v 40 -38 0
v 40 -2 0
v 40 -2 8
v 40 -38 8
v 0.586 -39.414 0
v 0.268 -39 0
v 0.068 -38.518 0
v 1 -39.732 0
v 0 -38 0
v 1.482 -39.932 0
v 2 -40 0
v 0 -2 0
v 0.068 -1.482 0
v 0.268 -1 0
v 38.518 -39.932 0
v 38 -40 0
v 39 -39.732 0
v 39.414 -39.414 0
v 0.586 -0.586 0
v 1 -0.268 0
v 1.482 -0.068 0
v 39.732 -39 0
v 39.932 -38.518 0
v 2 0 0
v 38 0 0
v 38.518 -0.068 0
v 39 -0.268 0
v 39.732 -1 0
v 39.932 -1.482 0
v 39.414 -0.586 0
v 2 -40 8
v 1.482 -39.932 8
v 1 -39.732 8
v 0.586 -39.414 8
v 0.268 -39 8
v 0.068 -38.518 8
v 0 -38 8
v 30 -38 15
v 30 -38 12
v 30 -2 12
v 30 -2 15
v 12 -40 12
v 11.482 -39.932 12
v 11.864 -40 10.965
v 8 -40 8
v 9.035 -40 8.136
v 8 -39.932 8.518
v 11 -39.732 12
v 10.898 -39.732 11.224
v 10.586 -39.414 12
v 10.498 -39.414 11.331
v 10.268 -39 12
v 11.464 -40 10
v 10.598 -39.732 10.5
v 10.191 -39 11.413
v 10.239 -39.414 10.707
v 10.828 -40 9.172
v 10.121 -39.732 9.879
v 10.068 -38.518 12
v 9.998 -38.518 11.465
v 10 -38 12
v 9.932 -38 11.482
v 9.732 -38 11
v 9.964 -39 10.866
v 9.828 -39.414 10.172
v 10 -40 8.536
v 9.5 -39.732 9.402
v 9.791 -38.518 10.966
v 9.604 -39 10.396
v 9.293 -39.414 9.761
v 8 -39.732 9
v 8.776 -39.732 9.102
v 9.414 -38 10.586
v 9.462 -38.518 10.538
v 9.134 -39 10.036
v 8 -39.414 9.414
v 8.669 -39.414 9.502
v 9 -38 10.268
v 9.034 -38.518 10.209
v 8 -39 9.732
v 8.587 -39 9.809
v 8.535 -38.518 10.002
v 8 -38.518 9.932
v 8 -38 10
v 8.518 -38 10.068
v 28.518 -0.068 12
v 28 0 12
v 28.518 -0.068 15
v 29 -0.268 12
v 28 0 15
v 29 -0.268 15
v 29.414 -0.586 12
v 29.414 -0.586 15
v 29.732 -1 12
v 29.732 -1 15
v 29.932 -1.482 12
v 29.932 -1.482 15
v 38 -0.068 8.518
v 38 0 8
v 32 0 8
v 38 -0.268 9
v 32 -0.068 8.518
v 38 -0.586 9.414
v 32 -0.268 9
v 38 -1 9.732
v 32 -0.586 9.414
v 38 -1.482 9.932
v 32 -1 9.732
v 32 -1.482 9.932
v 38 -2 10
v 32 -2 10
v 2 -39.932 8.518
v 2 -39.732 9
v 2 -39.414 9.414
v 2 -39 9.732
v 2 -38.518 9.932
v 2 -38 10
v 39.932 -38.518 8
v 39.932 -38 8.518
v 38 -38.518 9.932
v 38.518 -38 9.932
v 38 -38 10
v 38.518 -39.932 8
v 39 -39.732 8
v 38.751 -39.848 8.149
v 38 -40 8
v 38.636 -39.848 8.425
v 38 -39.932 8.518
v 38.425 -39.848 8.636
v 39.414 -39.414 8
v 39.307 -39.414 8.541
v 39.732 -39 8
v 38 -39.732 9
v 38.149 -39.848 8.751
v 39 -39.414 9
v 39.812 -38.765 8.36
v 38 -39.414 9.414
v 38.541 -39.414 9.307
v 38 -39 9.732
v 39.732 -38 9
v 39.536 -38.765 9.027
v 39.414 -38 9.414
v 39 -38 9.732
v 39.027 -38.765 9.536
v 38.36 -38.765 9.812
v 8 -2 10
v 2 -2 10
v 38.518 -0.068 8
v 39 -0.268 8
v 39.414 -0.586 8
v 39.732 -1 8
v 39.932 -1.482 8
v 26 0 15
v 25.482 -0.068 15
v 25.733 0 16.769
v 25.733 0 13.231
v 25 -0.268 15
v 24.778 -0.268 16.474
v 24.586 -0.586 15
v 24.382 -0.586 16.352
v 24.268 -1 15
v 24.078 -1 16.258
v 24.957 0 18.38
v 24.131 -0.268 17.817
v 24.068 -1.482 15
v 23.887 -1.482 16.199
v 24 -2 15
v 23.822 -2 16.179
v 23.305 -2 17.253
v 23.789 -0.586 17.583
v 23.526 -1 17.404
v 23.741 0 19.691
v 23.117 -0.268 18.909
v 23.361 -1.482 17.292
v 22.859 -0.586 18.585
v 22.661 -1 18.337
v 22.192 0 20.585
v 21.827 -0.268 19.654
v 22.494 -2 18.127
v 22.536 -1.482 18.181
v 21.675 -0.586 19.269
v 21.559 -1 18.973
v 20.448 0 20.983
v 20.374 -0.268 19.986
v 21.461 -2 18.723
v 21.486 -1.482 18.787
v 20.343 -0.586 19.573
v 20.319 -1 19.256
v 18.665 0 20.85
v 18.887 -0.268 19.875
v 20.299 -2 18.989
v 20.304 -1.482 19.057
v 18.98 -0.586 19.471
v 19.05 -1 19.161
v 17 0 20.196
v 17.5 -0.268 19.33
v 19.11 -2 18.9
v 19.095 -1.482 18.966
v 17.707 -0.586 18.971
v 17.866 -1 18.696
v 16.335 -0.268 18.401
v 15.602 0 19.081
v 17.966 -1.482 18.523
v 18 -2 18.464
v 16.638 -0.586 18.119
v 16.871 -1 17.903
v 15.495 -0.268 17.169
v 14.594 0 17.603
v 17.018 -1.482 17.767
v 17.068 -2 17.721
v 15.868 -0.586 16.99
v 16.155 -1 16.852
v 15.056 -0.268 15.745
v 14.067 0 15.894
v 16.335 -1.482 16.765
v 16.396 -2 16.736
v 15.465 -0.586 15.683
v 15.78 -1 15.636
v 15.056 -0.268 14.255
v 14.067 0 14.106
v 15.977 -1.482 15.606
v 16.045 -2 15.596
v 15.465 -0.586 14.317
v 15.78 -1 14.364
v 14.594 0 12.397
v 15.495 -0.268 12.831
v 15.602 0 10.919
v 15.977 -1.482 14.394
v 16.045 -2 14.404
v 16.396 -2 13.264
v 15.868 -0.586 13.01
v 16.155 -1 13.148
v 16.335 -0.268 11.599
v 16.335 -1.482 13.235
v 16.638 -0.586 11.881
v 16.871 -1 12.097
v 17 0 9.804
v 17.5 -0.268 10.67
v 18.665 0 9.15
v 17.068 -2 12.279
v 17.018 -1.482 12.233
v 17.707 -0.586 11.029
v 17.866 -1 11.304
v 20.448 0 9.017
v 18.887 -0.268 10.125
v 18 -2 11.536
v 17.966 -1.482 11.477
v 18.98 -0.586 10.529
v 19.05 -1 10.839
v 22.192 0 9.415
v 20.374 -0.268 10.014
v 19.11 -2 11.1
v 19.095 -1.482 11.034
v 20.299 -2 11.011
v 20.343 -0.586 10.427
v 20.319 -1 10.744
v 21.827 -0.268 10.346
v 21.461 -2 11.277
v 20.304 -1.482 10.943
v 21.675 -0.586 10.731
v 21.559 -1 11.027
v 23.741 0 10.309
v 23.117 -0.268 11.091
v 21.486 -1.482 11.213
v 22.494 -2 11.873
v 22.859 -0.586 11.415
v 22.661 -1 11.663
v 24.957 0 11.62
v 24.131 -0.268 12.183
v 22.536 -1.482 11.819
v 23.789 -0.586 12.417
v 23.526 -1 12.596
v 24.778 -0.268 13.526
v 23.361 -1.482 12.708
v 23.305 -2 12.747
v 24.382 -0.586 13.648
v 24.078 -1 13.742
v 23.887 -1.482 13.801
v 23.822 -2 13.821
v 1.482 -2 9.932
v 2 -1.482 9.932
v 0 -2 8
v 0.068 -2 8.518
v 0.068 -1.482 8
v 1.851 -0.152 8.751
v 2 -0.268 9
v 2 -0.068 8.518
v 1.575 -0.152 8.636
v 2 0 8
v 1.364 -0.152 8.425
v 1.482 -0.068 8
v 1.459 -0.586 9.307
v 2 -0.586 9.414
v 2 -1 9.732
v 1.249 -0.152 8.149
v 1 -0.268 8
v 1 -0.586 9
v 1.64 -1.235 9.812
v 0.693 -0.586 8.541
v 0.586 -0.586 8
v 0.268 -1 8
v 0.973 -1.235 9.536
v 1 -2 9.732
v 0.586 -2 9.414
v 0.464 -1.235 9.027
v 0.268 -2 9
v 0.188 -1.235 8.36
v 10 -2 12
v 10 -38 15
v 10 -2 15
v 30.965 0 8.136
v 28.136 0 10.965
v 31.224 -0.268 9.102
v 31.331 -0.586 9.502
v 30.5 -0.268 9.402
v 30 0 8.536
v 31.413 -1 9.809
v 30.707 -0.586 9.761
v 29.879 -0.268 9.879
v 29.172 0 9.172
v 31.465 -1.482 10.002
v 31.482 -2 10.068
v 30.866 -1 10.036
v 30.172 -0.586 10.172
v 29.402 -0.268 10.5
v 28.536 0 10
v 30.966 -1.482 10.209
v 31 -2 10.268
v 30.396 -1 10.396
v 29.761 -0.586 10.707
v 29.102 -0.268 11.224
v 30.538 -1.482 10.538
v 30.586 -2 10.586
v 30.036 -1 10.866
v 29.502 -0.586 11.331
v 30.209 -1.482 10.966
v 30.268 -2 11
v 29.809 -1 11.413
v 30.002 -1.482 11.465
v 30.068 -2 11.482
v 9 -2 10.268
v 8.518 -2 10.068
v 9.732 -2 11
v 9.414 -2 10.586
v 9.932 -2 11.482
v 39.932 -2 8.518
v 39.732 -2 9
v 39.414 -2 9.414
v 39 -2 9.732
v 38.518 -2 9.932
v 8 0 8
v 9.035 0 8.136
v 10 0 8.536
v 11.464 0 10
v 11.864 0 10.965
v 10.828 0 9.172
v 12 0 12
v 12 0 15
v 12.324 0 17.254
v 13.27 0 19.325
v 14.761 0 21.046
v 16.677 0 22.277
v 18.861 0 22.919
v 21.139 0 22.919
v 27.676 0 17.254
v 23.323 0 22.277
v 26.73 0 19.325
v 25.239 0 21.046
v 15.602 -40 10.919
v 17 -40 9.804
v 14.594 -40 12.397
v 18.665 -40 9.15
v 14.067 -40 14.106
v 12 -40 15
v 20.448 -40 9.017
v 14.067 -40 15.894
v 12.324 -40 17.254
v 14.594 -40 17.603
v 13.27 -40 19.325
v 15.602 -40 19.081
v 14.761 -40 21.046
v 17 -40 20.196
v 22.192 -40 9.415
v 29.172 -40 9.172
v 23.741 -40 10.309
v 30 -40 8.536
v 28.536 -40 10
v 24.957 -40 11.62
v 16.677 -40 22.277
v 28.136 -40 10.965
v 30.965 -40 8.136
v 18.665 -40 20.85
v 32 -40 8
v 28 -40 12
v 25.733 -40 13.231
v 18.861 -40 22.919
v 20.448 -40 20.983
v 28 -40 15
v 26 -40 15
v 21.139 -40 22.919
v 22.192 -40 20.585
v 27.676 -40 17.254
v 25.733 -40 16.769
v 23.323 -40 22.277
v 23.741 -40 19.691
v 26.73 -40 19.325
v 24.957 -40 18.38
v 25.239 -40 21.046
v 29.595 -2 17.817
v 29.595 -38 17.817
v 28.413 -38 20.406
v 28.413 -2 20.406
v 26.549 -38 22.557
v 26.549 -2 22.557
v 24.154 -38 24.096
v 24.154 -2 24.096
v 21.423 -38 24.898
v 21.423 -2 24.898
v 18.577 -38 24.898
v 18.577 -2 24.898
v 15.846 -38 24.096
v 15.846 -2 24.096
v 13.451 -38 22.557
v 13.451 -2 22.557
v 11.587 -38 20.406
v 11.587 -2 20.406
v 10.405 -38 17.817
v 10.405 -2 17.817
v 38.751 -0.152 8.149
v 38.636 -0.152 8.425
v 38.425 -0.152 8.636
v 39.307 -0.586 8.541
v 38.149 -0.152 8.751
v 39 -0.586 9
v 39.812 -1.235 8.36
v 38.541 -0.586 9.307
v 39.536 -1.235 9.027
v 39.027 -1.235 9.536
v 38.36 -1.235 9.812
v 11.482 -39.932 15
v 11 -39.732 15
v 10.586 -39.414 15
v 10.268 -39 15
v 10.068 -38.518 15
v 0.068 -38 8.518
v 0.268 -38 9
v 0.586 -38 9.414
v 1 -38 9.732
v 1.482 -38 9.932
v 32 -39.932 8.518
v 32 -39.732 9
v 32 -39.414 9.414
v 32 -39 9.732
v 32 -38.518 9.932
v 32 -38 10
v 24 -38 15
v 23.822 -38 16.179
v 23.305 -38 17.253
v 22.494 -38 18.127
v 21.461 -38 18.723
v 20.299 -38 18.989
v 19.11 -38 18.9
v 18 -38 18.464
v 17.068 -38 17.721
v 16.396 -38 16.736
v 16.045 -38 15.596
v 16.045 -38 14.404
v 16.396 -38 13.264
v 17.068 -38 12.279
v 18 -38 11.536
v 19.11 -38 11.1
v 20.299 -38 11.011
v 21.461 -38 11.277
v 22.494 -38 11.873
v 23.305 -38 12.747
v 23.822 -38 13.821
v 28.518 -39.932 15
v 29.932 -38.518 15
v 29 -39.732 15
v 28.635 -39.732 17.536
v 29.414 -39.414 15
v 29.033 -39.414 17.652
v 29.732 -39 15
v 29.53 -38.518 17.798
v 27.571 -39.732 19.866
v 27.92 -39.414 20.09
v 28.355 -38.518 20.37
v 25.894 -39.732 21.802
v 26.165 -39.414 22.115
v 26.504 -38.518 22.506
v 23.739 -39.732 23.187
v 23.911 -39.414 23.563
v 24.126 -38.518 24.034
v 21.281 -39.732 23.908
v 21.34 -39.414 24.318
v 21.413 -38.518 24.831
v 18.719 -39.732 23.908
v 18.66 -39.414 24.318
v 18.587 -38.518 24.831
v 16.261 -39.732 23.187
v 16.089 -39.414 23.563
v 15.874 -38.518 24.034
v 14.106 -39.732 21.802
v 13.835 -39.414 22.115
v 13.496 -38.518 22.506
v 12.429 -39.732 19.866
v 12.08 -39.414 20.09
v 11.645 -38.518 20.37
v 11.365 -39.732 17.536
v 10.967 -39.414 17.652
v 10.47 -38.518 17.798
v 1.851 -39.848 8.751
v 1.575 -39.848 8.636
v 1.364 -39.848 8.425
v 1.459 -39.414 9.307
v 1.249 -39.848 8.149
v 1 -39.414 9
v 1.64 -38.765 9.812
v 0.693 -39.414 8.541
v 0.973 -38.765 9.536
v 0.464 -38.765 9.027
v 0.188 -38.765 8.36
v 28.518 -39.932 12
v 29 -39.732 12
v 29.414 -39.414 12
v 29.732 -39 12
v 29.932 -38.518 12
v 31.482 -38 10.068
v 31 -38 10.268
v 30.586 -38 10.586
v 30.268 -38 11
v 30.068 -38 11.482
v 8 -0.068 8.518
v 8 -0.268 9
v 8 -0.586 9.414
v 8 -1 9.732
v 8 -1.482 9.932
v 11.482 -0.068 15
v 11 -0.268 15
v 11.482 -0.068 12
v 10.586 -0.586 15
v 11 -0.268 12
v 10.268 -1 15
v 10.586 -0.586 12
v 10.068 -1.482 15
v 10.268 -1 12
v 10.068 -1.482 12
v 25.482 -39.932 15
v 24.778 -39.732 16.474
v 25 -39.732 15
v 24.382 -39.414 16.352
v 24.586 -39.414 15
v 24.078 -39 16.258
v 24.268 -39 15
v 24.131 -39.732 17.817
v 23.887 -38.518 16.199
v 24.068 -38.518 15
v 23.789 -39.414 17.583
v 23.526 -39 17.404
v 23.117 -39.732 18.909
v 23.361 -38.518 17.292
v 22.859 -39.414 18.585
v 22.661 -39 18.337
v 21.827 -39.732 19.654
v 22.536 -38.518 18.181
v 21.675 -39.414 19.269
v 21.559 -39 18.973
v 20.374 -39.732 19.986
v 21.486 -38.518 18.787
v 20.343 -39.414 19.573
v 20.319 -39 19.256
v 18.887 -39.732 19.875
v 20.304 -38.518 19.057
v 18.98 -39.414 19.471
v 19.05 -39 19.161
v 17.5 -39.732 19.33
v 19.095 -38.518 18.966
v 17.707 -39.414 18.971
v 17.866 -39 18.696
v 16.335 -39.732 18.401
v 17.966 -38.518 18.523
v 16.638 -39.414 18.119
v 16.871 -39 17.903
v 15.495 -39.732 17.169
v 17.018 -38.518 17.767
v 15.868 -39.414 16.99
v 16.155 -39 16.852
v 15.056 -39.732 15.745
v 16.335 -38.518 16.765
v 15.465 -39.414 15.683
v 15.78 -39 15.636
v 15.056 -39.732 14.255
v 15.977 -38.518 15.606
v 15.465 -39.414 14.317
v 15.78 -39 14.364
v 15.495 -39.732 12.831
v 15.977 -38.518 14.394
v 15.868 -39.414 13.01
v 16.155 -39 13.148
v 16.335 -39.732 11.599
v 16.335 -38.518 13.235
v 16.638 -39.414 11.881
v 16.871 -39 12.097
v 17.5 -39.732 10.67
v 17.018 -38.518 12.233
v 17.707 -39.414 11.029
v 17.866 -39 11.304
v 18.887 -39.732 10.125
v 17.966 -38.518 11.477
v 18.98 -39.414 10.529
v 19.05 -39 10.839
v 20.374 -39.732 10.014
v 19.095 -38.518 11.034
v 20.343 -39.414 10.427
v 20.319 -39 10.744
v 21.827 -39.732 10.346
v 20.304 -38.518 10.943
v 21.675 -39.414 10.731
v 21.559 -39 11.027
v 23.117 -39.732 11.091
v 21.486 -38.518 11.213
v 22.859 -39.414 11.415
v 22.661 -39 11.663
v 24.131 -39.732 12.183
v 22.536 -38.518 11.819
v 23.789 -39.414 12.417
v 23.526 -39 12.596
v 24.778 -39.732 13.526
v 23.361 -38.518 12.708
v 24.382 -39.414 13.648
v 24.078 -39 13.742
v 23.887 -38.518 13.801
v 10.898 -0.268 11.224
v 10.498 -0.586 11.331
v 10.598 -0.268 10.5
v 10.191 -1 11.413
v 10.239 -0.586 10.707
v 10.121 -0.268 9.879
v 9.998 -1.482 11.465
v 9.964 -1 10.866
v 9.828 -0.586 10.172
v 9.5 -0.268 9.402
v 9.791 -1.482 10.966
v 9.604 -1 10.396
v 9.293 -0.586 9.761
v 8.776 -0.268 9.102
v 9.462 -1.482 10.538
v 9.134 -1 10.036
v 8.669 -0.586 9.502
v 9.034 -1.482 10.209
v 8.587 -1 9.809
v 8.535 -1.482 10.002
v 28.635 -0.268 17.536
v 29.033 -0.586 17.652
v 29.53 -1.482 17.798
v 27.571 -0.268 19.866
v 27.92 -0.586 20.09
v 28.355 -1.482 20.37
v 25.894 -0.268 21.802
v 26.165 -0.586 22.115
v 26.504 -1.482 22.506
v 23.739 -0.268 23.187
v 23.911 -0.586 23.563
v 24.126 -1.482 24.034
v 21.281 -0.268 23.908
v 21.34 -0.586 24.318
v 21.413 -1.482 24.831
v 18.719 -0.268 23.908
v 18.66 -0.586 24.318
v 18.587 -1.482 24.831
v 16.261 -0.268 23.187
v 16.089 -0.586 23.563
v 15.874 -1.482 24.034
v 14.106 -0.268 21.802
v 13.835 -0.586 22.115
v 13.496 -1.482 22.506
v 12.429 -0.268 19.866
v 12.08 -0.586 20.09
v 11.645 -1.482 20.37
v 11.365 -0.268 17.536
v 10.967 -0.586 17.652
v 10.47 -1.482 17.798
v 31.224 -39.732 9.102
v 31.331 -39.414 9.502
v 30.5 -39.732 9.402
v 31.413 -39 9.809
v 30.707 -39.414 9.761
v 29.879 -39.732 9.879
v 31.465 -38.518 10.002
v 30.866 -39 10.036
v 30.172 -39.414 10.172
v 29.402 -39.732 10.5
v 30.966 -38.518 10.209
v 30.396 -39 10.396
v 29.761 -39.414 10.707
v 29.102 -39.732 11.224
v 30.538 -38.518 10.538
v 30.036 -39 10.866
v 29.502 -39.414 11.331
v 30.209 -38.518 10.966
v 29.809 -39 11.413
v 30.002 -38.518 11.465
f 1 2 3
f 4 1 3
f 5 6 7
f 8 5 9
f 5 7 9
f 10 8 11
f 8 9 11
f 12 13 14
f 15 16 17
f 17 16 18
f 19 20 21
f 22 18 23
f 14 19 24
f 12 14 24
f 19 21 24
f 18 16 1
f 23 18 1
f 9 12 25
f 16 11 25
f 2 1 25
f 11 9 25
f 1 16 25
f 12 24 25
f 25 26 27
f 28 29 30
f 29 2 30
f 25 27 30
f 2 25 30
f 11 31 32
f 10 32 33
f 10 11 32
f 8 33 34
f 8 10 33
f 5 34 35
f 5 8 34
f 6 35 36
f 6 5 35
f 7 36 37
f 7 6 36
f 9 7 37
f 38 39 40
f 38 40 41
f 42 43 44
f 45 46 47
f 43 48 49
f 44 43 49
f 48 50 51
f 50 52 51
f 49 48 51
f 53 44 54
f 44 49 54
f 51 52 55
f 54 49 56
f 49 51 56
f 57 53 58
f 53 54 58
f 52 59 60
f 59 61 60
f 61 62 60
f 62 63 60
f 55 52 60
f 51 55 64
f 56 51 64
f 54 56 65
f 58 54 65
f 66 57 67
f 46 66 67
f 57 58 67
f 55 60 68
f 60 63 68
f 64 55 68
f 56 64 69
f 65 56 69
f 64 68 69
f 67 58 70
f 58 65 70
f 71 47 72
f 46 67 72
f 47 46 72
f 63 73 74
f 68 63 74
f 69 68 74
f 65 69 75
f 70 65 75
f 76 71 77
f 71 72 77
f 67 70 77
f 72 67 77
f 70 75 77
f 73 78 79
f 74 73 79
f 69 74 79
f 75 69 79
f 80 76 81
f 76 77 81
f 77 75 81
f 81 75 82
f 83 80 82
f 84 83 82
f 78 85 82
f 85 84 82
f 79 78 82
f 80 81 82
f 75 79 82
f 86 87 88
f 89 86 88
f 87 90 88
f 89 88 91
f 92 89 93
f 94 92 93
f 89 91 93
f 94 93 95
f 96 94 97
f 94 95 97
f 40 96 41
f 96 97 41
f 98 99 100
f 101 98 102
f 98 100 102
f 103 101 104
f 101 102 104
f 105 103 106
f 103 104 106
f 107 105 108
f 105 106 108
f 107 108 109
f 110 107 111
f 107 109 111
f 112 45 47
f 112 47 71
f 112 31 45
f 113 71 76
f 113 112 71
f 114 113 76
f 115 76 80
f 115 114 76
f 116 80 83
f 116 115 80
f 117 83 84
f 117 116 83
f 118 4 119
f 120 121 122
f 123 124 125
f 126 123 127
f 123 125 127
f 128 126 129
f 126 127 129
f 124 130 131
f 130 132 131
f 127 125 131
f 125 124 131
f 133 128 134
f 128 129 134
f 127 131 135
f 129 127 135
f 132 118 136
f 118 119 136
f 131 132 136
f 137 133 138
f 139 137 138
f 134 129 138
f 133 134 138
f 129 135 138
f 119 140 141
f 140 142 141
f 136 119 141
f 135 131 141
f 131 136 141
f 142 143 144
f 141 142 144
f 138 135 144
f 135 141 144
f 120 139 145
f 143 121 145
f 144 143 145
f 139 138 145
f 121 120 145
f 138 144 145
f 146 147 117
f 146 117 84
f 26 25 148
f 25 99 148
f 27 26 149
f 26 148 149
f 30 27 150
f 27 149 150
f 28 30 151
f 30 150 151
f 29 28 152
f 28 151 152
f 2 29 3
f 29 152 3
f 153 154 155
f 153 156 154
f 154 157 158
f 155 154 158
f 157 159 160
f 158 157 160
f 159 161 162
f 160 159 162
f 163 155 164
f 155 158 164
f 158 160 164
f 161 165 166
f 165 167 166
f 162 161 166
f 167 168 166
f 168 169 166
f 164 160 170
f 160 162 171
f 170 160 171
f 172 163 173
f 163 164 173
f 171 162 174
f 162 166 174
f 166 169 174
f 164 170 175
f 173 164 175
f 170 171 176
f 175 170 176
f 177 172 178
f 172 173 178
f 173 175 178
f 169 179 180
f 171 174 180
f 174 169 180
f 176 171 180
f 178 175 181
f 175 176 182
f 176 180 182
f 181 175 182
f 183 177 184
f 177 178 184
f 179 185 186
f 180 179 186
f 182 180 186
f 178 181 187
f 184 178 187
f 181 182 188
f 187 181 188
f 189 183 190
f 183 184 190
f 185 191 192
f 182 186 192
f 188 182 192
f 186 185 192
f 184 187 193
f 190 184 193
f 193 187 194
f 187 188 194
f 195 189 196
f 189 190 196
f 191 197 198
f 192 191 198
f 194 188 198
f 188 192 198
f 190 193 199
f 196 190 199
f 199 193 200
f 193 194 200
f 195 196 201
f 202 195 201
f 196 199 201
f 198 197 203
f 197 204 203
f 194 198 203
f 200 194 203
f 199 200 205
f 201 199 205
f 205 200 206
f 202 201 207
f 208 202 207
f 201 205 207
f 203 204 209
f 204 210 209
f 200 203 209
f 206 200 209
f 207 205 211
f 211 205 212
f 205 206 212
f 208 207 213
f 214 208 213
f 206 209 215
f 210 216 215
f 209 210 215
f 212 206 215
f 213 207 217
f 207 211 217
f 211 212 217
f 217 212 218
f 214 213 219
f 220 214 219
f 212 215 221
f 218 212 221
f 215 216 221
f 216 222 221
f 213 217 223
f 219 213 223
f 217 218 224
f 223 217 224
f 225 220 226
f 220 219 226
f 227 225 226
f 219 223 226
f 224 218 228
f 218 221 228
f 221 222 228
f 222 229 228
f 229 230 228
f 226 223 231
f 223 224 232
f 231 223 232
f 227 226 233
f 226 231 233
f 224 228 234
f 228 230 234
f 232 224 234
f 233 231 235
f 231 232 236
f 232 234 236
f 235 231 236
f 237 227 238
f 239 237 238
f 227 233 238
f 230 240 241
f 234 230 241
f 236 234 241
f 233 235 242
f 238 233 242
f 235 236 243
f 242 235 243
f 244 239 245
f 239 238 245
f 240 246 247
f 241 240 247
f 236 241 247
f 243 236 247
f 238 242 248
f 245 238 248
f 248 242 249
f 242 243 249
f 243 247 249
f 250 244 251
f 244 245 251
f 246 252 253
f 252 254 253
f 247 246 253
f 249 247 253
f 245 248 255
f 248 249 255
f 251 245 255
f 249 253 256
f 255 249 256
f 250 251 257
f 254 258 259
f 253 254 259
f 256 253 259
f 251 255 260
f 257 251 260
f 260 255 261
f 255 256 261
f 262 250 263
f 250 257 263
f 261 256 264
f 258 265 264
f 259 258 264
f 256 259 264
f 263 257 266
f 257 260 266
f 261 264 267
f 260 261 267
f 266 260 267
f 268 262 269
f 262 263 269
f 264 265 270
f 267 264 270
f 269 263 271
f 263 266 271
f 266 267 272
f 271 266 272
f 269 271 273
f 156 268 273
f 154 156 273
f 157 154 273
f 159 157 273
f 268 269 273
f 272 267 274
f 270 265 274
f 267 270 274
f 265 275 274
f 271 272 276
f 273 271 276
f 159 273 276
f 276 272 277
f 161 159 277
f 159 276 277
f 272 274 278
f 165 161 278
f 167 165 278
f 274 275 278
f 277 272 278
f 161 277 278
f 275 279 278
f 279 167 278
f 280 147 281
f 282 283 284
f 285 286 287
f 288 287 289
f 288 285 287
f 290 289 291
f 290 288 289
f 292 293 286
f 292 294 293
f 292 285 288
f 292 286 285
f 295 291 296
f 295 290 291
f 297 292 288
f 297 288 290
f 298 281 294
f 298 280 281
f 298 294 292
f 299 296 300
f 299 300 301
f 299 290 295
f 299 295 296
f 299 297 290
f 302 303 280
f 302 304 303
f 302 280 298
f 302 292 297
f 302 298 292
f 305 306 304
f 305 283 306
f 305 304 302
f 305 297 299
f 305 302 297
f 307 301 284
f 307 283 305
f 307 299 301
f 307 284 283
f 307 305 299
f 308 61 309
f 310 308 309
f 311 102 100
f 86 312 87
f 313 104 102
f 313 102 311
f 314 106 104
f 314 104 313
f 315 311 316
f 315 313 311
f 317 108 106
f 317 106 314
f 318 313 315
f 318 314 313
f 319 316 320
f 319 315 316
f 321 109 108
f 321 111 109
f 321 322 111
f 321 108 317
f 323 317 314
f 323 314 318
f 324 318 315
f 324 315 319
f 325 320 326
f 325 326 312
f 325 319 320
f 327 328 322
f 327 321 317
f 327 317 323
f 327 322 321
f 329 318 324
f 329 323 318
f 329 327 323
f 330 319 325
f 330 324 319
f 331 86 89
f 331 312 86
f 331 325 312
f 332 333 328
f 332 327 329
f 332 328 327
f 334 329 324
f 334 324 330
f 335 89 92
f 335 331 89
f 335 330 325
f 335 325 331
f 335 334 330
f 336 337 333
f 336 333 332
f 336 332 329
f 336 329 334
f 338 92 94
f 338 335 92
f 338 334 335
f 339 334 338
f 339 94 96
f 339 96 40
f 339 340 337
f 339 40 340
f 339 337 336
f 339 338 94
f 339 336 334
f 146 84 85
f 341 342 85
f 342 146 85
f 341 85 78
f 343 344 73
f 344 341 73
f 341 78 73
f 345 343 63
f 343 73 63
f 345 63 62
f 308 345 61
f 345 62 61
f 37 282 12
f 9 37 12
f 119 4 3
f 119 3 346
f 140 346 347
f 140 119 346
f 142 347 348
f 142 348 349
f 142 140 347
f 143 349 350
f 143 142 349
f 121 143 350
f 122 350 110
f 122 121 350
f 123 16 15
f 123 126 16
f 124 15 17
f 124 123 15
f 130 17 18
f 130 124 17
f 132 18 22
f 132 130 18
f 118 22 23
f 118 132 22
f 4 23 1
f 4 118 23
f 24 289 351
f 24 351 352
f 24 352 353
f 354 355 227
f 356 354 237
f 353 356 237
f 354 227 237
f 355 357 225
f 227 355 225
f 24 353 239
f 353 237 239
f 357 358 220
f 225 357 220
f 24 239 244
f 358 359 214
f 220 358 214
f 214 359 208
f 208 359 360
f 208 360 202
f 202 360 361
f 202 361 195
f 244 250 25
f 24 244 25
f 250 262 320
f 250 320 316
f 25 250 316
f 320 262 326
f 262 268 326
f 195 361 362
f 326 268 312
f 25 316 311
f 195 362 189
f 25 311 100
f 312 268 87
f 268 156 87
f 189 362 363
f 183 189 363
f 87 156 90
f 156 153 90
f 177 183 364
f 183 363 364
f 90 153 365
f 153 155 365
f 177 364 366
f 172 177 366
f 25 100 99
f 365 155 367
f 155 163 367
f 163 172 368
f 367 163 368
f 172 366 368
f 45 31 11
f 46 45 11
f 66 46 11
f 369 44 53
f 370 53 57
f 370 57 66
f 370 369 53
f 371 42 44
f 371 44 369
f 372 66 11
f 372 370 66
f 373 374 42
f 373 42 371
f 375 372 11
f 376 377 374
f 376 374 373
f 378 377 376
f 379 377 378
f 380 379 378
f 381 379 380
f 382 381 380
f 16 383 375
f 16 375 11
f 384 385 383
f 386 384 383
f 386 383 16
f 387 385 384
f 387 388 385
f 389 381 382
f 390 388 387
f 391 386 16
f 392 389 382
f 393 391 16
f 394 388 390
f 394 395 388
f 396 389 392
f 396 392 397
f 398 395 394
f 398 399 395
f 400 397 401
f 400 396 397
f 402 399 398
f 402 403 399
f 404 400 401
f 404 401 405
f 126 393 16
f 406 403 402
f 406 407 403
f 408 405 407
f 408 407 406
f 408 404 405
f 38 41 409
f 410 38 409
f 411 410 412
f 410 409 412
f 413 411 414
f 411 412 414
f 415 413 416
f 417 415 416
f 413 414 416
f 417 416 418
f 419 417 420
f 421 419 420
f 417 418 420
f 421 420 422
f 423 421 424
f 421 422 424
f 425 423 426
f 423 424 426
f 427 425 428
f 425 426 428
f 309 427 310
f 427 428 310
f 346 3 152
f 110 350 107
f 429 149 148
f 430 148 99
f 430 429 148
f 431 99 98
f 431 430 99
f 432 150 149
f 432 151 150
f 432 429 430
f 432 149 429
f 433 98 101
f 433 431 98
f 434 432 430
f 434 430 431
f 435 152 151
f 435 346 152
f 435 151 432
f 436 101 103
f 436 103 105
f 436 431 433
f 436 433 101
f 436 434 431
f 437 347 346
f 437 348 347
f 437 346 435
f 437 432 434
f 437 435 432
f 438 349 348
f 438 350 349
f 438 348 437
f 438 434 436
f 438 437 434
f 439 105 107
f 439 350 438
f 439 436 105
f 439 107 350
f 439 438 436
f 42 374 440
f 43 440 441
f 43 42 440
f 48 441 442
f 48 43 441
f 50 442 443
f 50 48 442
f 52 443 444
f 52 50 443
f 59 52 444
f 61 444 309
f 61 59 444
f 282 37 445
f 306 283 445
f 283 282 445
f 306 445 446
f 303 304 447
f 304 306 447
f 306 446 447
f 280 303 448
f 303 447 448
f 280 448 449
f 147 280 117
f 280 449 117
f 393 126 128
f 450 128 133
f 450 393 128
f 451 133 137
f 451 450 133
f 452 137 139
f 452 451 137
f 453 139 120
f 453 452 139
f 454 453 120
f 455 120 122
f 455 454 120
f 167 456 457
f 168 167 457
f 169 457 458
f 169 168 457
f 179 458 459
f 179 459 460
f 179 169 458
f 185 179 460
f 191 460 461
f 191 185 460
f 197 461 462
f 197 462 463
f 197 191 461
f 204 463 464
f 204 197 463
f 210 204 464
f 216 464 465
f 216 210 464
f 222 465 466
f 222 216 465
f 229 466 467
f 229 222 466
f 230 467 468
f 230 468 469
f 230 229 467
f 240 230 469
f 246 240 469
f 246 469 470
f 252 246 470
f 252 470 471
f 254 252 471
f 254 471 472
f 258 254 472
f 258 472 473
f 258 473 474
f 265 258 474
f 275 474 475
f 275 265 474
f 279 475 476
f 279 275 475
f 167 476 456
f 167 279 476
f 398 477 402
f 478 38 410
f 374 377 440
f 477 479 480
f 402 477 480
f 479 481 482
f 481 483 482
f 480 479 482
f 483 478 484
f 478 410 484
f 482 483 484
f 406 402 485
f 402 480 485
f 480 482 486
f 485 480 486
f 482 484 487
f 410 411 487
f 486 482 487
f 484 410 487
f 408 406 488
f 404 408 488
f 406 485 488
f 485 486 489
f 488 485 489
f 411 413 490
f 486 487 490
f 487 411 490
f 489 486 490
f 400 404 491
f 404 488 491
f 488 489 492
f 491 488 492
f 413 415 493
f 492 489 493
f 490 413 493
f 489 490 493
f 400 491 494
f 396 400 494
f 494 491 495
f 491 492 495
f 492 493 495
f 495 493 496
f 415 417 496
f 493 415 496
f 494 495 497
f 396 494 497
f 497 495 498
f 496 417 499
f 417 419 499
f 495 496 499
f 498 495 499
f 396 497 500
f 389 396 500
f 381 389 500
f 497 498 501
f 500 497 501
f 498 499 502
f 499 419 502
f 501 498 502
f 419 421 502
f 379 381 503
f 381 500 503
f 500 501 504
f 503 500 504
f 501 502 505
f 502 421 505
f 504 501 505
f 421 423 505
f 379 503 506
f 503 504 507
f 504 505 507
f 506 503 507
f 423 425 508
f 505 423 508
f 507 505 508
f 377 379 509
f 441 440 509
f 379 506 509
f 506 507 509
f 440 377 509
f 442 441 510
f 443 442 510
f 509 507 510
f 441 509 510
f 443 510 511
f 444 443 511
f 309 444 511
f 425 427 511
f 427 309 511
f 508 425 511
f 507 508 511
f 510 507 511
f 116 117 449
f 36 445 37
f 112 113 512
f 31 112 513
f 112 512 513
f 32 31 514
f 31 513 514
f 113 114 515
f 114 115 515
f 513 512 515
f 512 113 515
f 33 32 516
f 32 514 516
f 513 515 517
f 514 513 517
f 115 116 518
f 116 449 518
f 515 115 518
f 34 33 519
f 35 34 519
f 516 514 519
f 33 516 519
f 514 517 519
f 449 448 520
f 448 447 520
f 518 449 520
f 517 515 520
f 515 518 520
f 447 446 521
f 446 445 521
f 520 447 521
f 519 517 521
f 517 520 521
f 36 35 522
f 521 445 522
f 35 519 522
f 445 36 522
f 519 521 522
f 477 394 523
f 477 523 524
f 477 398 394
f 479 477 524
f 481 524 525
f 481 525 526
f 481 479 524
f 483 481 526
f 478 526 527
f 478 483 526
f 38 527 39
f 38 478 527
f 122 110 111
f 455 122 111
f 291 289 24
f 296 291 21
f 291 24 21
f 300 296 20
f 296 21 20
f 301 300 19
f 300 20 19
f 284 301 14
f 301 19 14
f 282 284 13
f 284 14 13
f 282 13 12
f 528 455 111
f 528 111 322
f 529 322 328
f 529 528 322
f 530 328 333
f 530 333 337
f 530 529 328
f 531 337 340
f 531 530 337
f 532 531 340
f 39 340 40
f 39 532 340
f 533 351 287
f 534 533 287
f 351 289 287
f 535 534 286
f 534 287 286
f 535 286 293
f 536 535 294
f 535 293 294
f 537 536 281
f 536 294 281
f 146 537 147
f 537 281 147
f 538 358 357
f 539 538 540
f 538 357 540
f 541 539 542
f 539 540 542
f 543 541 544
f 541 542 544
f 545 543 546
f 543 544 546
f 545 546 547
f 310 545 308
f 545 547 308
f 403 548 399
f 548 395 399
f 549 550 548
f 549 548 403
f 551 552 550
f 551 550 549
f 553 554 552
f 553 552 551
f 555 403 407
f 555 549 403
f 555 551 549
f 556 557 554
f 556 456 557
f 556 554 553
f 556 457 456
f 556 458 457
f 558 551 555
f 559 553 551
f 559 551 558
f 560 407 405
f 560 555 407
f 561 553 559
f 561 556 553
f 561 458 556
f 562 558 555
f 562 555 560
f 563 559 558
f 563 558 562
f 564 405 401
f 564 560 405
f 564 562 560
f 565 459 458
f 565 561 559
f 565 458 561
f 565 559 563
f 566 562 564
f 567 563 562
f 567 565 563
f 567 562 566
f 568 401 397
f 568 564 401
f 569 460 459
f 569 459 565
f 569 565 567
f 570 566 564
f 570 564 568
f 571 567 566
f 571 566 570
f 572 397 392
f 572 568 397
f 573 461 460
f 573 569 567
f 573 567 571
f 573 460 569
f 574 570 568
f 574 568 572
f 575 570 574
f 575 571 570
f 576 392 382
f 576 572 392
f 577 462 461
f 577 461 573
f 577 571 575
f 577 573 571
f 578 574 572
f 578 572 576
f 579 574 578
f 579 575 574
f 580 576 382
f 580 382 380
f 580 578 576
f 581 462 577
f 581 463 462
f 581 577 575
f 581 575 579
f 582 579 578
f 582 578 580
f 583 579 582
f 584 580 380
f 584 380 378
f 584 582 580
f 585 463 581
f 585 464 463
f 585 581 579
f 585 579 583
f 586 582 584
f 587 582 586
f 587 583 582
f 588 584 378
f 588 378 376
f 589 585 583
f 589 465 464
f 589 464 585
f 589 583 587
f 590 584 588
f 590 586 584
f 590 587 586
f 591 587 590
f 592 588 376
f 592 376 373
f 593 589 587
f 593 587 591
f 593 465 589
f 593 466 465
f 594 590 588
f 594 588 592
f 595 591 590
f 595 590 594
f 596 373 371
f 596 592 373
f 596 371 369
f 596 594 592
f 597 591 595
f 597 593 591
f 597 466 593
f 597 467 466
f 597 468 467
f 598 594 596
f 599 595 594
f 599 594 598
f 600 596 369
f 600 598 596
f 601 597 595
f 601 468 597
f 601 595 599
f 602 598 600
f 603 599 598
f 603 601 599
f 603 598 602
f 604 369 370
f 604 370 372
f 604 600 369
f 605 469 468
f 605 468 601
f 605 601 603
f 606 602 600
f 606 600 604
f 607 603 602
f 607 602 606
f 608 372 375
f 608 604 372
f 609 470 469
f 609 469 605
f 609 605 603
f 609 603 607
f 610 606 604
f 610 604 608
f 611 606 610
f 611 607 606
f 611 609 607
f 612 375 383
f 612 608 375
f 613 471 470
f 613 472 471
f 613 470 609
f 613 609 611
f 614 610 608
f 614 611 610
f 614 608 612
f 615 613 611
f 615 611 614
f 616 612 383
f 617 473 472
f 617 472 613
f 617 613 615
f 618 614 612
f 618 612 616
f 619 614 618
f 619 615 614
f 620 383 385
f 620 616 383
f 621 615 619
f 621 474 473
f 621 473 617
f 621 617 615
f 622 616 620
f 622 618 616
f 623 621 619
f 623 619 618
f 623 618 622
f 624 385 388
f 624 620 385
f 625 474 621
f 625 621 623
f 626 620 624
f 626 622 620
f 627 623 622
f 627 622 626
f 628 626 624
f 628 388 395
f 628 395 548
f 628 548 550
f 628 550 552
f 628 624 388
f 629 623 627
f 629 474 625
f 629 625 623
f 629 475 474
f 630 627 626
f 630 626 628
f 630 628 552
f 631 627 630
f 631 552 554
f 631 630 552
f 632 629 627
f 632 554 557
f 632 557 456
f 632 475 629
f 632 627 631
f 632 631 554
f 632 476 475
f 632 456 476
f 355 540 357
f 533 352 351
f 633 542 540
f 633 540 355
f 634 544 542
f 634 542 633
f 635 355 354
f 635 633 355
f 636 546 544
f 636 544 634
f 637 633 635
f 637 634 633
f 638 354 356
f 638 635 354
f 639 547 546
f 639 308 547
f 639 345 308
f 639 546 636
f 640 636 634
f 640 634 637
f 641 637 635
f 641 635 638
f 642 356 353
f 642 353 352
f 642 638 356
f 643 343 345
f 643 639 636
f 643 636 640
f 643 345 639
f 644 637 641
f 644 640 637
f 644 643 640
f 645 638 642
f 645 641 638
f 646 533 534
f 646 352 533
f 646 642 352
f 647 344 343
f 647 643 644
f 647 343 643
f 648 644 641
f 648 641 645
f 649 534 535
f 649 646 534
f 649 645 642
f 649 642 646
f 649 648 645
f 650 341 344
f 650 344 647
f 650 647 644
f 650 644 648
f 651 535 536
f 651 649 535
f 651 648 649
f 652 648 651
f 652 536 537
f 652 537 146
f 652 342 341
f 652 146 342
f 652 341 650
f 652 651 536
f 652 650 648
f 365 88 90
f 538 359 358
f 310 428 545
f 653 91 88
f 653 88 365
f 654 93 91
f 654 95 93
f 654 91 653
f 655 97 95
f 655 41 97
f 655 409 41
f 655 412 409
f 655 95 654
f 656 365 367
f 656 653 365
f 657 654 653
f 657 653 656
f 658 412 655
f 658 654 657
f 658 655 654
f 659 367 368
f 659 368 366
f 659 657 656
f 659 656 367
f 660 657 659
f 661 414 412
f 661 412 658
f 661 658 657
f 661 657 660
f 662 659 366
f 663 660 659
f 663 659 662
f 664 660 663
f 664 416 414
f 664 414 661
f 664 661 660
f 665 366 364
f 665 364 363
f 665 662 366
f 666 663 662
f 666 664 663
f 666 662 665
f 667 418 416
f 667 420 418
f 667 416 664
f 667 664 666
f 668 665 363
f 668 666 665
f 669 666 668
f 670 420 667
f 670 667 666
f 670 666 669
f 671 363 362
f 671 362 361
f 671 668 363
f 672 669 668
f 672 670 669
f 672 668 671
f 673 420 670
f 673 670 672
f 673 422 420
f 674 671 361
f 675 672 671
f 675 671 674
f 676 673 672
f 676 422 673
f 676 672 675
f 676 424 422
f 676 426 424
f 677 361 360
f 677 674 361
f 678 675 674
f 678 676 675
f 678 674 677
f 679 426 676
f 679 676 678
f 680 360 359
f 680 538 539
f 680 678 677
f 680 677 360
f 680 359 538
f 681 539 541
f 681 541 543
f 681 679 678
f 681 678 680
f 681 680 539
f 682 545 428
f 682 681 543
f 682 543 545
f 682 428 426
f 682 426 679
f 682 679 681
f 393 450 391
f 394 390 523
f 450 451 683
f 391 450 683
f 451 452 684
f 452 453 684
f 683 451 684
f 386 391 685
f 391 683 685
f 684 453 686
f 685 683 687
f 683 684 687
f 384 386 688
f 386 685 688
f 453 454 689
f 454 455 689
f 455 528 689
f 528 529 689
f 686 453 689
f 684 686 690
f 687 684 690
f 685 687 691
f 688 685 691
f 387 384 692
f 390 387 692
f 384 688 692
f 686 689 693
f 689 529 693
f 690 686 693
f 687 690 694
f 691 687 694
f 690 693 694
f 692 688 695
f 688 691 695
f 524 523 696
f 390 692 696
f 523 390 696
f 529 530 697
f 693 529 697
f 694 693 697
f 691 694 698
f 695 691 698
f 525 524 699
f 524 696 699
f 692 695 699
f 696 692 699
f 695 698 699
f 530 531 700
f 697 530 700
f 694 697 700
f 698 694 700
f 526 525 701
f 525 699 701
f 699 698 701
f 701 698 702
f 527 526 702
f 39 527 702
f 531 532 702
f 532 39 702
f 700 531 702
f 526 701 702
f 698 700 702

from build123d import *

# Parameters (mm, degrees)
SKETCH_R      = 4
EXTRUDE_DEPTH = 40
FILLET_R      = 2
FILLET001_R   = 2


with BuildPart() as part:
    # Sketch → Extrude (new body)
    with BuildSketch(Plane.XZ):
        with BuildLine():
            Line((0, 0), (40, 0))
            Line((40, 0), (40, 10))
            Line((40, 10), (30, 10))
            Line((30, 10), (30, 15))
            ThreePointArc((30, 15), (20, 25), (10, 15))
            Line((10, 10), (10, 15))
            Line((0, 10), (10, 10))
            Line((0, 10), (0, 0))
        make_face()
        with Locations((20, 15)):
            Circle(SKETCH_R, mode=Mode.SUBTRACT)
    extrude(amount=EXTRUDE_DEPTH)

    # Fillet
    fillet_edges = [part.edges().sort_by_distance(p)[0] for p in [
        (40, -20, 10),
        (30, -20, 10),
        (10, -20, 10),
        (0, -20, 10),
    ]]
    fillet(fillet_edges, radius=FILLET_R)

    # Fillet001
    fillet001_edges = [part.edges().sort_by_distance(p)[0] for p in [
        (20, 0, 25),
        (16, 0, 15),
        (20, -40, 25),
        (16, -40, 15),
    ]]
    fillet(fillet001_edges, radius=FILLET001_R)


solid = part.part
